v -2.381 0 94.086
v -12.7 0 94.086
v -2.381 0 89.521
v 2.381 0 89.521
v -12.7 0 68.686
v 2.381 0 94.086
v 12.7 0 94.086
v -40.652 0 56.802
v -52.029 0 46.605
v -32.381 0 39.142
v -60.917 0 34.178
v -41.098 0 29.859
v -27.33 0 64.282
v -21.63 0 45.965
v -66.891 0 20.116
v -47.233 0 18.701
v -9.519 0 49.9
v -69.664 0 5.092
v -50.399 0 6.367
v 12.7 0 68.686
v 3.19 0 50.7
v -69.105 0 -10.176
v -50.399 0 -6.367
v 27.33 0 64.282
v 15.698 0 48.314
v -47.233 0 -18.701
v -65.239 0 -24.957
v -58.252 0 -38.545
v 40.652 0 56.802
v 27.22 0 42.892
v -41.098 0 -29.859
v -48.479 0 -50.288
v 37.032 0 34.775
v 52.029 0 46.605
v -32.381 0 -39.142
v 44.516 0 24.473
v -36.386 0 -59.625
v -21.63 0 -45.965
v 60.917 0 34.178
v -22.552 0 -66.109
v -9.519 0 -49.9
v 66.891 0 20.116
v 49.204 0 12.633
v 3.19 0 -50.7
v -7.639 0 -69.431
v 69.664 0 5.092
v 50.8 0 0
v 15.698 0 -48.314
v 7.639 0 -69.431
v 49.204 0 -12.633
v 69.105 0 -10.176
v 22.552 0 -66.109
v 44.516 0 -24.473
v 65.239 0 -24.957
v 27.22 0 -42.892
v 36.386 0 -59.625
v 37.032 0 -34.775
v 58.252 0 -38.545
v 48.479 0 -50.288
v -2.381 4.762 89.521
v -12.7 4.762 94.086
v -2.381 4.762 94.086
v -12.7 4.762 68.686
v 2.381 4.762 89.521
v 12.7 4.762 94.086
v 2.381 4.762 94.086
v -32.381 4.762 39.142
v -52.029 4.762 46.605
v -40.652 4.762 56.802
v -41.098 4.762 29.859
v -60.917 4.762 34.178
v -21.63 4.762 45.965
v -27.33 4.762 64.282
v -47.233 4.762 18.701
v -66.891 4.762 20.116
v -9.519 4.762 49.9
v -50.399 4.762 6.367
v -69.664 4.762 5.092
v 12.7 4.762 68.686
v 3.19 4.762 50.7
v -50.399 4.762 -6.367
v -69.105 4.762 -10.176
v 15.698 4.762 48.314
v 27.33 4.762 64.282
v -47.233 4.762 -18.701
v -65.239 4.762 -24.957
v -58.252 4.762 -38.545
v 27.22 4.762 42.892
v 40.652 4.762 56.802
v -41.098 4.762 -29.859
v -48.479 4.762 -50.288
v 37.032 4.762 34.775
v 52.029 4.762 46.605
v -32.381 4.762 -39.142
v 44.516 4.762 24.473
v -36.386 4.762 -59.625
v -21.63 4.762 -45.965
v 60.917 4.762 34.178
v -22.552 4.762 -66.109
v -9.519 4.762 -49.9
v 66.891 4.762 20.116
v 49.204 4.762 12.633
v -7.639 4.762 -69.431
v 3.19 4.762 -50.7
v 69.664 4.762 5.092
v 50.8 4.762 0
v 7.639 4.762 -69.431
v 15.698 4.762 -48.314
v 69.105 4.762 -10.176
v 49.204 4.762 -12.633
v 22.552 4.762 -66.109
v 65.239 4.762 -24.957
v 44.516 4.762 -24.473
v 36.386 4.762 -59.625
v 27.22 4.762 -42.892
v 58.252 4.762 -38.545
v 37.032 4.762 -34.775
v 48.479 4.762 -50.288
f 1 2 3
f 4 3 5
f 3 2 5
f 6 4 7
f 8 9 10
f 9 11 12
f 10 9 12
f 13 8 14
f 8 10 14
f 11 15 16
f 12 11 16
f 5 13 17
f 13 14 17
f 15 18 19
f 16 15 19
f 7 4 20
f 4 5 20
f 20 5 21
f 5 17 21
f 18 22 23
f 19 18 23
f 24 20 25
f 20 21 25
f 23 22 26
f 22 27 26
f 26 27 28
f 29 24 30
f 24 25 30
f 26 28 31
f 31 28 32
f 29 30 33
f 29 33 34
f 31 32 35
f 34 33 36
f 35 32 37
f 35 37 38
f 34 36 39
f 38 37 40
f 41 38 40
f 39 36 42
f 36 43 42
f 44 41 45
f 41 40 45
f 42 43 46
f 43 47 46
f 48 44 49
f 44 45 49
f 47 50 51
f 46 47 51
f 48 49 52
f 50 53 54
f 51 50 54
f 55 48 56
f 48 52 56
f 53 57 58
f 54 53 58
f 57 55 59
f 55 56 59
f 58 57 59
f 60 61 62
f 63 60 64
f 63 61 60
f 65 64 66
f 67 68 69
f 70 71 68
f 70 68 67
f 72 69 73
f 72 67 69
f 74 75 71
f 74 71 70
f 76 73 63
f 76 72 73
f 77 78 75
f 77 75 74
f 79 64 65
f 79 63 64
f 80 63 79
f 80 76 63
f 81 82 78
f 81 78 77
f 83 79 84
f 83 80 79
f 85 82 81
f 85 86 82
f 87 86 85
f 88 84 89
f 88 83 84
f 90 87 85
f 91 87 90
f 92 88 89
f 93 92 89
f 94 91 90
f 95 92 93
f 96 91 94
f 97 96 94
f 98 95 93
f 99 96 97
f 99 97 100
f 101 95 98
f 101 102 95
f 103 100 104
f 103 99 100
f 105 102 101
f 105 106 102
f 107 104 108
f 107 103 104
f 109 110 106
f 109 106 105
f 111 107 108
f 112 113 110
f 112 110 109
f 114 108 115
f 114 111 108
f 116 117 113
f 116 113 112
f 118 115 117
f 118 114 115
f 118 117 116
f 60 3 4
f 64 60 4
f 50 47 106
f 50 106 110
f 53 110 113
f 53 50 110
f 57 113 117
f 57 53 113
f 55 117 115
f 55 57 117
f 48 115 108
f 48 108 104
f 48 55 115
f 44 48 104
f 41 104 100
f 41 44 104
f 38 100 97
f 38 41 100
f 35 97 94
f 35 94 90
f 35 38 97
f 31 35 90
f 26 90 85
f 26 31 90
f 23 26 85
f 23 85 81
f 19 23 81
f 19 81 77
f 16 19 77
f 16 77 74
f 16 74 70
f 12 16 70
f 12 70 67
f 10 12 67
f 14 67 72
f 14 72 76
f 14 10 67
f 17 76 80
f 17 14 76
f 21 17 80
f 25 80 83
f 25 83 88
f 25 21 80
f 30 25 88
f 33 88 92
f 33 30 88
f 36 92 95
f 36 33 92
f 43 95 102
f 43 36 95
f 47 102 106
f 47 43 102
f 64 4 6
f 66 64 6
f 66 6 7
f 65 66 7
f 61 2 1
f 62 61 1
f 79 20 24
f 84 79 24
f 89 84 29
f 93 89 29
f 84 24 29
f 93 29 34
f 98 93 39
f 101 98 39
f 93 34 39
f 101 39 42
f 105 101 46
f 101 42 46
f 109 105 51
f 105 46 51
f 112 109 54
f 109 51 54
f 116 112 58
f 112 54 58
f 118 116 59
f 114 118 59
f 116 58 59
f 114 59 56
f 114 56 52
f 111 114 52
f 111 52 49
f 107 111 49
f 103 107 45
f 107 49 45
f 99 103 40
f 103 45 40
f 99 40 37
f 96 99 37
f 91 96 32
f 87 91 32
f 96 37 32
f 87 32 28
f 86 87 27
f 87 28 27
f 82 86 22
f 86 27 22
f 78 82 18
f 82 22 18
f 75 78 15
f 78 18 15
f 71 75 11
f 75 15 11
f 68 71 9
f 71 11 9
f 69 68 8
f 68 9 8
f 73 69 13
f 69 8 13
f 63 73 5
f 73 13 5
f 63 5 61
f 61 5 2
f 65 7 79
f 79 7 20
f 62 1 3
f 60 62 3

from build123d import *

# Parameters (mm, degrees)
SKETCH1_R           = 50.8
BOSS_EXTRUDE1_DEPTH = 4.7625


with BuildPart() as part:
    # Sketch1 → Boss-Extrude1 (new body)
    with BuildSketch(Plane(origin=(0, 0, 0), x_dir=(1, 0, 0), z_dir=(0, 1, 0))):
        with BuildLine():
            Line((12.7, -94.085751798), (12.7, -68.685751798))
            ThreePointArc((12.7, -68.685751798), (0, 69.85), (-12.7, -68.685751798))
            Line((-12.7, -68.685751798), (-12.7, -94.085751798))
            Line((-12.7, -94.085751798), (-2.38125, -94.085751798))
            Line((-2.38125, -94.085751798), (-2.38125, -89.521371798))
            Line((-2.38125, -89.521371798), (2.38125, -89.521371798))
            Line((2.38125, -89.521371798), (2.38125, -94.085751798))
            Line((2.38125, -94.085751798), (12.7, -94.085751798))
        make_face()
        Circle(SKETCH1_R, mode=Mode.SUBTRACT)
    extrude(amount=BOSS_EXTRUDE1_DEPTH)


solid = part.part
